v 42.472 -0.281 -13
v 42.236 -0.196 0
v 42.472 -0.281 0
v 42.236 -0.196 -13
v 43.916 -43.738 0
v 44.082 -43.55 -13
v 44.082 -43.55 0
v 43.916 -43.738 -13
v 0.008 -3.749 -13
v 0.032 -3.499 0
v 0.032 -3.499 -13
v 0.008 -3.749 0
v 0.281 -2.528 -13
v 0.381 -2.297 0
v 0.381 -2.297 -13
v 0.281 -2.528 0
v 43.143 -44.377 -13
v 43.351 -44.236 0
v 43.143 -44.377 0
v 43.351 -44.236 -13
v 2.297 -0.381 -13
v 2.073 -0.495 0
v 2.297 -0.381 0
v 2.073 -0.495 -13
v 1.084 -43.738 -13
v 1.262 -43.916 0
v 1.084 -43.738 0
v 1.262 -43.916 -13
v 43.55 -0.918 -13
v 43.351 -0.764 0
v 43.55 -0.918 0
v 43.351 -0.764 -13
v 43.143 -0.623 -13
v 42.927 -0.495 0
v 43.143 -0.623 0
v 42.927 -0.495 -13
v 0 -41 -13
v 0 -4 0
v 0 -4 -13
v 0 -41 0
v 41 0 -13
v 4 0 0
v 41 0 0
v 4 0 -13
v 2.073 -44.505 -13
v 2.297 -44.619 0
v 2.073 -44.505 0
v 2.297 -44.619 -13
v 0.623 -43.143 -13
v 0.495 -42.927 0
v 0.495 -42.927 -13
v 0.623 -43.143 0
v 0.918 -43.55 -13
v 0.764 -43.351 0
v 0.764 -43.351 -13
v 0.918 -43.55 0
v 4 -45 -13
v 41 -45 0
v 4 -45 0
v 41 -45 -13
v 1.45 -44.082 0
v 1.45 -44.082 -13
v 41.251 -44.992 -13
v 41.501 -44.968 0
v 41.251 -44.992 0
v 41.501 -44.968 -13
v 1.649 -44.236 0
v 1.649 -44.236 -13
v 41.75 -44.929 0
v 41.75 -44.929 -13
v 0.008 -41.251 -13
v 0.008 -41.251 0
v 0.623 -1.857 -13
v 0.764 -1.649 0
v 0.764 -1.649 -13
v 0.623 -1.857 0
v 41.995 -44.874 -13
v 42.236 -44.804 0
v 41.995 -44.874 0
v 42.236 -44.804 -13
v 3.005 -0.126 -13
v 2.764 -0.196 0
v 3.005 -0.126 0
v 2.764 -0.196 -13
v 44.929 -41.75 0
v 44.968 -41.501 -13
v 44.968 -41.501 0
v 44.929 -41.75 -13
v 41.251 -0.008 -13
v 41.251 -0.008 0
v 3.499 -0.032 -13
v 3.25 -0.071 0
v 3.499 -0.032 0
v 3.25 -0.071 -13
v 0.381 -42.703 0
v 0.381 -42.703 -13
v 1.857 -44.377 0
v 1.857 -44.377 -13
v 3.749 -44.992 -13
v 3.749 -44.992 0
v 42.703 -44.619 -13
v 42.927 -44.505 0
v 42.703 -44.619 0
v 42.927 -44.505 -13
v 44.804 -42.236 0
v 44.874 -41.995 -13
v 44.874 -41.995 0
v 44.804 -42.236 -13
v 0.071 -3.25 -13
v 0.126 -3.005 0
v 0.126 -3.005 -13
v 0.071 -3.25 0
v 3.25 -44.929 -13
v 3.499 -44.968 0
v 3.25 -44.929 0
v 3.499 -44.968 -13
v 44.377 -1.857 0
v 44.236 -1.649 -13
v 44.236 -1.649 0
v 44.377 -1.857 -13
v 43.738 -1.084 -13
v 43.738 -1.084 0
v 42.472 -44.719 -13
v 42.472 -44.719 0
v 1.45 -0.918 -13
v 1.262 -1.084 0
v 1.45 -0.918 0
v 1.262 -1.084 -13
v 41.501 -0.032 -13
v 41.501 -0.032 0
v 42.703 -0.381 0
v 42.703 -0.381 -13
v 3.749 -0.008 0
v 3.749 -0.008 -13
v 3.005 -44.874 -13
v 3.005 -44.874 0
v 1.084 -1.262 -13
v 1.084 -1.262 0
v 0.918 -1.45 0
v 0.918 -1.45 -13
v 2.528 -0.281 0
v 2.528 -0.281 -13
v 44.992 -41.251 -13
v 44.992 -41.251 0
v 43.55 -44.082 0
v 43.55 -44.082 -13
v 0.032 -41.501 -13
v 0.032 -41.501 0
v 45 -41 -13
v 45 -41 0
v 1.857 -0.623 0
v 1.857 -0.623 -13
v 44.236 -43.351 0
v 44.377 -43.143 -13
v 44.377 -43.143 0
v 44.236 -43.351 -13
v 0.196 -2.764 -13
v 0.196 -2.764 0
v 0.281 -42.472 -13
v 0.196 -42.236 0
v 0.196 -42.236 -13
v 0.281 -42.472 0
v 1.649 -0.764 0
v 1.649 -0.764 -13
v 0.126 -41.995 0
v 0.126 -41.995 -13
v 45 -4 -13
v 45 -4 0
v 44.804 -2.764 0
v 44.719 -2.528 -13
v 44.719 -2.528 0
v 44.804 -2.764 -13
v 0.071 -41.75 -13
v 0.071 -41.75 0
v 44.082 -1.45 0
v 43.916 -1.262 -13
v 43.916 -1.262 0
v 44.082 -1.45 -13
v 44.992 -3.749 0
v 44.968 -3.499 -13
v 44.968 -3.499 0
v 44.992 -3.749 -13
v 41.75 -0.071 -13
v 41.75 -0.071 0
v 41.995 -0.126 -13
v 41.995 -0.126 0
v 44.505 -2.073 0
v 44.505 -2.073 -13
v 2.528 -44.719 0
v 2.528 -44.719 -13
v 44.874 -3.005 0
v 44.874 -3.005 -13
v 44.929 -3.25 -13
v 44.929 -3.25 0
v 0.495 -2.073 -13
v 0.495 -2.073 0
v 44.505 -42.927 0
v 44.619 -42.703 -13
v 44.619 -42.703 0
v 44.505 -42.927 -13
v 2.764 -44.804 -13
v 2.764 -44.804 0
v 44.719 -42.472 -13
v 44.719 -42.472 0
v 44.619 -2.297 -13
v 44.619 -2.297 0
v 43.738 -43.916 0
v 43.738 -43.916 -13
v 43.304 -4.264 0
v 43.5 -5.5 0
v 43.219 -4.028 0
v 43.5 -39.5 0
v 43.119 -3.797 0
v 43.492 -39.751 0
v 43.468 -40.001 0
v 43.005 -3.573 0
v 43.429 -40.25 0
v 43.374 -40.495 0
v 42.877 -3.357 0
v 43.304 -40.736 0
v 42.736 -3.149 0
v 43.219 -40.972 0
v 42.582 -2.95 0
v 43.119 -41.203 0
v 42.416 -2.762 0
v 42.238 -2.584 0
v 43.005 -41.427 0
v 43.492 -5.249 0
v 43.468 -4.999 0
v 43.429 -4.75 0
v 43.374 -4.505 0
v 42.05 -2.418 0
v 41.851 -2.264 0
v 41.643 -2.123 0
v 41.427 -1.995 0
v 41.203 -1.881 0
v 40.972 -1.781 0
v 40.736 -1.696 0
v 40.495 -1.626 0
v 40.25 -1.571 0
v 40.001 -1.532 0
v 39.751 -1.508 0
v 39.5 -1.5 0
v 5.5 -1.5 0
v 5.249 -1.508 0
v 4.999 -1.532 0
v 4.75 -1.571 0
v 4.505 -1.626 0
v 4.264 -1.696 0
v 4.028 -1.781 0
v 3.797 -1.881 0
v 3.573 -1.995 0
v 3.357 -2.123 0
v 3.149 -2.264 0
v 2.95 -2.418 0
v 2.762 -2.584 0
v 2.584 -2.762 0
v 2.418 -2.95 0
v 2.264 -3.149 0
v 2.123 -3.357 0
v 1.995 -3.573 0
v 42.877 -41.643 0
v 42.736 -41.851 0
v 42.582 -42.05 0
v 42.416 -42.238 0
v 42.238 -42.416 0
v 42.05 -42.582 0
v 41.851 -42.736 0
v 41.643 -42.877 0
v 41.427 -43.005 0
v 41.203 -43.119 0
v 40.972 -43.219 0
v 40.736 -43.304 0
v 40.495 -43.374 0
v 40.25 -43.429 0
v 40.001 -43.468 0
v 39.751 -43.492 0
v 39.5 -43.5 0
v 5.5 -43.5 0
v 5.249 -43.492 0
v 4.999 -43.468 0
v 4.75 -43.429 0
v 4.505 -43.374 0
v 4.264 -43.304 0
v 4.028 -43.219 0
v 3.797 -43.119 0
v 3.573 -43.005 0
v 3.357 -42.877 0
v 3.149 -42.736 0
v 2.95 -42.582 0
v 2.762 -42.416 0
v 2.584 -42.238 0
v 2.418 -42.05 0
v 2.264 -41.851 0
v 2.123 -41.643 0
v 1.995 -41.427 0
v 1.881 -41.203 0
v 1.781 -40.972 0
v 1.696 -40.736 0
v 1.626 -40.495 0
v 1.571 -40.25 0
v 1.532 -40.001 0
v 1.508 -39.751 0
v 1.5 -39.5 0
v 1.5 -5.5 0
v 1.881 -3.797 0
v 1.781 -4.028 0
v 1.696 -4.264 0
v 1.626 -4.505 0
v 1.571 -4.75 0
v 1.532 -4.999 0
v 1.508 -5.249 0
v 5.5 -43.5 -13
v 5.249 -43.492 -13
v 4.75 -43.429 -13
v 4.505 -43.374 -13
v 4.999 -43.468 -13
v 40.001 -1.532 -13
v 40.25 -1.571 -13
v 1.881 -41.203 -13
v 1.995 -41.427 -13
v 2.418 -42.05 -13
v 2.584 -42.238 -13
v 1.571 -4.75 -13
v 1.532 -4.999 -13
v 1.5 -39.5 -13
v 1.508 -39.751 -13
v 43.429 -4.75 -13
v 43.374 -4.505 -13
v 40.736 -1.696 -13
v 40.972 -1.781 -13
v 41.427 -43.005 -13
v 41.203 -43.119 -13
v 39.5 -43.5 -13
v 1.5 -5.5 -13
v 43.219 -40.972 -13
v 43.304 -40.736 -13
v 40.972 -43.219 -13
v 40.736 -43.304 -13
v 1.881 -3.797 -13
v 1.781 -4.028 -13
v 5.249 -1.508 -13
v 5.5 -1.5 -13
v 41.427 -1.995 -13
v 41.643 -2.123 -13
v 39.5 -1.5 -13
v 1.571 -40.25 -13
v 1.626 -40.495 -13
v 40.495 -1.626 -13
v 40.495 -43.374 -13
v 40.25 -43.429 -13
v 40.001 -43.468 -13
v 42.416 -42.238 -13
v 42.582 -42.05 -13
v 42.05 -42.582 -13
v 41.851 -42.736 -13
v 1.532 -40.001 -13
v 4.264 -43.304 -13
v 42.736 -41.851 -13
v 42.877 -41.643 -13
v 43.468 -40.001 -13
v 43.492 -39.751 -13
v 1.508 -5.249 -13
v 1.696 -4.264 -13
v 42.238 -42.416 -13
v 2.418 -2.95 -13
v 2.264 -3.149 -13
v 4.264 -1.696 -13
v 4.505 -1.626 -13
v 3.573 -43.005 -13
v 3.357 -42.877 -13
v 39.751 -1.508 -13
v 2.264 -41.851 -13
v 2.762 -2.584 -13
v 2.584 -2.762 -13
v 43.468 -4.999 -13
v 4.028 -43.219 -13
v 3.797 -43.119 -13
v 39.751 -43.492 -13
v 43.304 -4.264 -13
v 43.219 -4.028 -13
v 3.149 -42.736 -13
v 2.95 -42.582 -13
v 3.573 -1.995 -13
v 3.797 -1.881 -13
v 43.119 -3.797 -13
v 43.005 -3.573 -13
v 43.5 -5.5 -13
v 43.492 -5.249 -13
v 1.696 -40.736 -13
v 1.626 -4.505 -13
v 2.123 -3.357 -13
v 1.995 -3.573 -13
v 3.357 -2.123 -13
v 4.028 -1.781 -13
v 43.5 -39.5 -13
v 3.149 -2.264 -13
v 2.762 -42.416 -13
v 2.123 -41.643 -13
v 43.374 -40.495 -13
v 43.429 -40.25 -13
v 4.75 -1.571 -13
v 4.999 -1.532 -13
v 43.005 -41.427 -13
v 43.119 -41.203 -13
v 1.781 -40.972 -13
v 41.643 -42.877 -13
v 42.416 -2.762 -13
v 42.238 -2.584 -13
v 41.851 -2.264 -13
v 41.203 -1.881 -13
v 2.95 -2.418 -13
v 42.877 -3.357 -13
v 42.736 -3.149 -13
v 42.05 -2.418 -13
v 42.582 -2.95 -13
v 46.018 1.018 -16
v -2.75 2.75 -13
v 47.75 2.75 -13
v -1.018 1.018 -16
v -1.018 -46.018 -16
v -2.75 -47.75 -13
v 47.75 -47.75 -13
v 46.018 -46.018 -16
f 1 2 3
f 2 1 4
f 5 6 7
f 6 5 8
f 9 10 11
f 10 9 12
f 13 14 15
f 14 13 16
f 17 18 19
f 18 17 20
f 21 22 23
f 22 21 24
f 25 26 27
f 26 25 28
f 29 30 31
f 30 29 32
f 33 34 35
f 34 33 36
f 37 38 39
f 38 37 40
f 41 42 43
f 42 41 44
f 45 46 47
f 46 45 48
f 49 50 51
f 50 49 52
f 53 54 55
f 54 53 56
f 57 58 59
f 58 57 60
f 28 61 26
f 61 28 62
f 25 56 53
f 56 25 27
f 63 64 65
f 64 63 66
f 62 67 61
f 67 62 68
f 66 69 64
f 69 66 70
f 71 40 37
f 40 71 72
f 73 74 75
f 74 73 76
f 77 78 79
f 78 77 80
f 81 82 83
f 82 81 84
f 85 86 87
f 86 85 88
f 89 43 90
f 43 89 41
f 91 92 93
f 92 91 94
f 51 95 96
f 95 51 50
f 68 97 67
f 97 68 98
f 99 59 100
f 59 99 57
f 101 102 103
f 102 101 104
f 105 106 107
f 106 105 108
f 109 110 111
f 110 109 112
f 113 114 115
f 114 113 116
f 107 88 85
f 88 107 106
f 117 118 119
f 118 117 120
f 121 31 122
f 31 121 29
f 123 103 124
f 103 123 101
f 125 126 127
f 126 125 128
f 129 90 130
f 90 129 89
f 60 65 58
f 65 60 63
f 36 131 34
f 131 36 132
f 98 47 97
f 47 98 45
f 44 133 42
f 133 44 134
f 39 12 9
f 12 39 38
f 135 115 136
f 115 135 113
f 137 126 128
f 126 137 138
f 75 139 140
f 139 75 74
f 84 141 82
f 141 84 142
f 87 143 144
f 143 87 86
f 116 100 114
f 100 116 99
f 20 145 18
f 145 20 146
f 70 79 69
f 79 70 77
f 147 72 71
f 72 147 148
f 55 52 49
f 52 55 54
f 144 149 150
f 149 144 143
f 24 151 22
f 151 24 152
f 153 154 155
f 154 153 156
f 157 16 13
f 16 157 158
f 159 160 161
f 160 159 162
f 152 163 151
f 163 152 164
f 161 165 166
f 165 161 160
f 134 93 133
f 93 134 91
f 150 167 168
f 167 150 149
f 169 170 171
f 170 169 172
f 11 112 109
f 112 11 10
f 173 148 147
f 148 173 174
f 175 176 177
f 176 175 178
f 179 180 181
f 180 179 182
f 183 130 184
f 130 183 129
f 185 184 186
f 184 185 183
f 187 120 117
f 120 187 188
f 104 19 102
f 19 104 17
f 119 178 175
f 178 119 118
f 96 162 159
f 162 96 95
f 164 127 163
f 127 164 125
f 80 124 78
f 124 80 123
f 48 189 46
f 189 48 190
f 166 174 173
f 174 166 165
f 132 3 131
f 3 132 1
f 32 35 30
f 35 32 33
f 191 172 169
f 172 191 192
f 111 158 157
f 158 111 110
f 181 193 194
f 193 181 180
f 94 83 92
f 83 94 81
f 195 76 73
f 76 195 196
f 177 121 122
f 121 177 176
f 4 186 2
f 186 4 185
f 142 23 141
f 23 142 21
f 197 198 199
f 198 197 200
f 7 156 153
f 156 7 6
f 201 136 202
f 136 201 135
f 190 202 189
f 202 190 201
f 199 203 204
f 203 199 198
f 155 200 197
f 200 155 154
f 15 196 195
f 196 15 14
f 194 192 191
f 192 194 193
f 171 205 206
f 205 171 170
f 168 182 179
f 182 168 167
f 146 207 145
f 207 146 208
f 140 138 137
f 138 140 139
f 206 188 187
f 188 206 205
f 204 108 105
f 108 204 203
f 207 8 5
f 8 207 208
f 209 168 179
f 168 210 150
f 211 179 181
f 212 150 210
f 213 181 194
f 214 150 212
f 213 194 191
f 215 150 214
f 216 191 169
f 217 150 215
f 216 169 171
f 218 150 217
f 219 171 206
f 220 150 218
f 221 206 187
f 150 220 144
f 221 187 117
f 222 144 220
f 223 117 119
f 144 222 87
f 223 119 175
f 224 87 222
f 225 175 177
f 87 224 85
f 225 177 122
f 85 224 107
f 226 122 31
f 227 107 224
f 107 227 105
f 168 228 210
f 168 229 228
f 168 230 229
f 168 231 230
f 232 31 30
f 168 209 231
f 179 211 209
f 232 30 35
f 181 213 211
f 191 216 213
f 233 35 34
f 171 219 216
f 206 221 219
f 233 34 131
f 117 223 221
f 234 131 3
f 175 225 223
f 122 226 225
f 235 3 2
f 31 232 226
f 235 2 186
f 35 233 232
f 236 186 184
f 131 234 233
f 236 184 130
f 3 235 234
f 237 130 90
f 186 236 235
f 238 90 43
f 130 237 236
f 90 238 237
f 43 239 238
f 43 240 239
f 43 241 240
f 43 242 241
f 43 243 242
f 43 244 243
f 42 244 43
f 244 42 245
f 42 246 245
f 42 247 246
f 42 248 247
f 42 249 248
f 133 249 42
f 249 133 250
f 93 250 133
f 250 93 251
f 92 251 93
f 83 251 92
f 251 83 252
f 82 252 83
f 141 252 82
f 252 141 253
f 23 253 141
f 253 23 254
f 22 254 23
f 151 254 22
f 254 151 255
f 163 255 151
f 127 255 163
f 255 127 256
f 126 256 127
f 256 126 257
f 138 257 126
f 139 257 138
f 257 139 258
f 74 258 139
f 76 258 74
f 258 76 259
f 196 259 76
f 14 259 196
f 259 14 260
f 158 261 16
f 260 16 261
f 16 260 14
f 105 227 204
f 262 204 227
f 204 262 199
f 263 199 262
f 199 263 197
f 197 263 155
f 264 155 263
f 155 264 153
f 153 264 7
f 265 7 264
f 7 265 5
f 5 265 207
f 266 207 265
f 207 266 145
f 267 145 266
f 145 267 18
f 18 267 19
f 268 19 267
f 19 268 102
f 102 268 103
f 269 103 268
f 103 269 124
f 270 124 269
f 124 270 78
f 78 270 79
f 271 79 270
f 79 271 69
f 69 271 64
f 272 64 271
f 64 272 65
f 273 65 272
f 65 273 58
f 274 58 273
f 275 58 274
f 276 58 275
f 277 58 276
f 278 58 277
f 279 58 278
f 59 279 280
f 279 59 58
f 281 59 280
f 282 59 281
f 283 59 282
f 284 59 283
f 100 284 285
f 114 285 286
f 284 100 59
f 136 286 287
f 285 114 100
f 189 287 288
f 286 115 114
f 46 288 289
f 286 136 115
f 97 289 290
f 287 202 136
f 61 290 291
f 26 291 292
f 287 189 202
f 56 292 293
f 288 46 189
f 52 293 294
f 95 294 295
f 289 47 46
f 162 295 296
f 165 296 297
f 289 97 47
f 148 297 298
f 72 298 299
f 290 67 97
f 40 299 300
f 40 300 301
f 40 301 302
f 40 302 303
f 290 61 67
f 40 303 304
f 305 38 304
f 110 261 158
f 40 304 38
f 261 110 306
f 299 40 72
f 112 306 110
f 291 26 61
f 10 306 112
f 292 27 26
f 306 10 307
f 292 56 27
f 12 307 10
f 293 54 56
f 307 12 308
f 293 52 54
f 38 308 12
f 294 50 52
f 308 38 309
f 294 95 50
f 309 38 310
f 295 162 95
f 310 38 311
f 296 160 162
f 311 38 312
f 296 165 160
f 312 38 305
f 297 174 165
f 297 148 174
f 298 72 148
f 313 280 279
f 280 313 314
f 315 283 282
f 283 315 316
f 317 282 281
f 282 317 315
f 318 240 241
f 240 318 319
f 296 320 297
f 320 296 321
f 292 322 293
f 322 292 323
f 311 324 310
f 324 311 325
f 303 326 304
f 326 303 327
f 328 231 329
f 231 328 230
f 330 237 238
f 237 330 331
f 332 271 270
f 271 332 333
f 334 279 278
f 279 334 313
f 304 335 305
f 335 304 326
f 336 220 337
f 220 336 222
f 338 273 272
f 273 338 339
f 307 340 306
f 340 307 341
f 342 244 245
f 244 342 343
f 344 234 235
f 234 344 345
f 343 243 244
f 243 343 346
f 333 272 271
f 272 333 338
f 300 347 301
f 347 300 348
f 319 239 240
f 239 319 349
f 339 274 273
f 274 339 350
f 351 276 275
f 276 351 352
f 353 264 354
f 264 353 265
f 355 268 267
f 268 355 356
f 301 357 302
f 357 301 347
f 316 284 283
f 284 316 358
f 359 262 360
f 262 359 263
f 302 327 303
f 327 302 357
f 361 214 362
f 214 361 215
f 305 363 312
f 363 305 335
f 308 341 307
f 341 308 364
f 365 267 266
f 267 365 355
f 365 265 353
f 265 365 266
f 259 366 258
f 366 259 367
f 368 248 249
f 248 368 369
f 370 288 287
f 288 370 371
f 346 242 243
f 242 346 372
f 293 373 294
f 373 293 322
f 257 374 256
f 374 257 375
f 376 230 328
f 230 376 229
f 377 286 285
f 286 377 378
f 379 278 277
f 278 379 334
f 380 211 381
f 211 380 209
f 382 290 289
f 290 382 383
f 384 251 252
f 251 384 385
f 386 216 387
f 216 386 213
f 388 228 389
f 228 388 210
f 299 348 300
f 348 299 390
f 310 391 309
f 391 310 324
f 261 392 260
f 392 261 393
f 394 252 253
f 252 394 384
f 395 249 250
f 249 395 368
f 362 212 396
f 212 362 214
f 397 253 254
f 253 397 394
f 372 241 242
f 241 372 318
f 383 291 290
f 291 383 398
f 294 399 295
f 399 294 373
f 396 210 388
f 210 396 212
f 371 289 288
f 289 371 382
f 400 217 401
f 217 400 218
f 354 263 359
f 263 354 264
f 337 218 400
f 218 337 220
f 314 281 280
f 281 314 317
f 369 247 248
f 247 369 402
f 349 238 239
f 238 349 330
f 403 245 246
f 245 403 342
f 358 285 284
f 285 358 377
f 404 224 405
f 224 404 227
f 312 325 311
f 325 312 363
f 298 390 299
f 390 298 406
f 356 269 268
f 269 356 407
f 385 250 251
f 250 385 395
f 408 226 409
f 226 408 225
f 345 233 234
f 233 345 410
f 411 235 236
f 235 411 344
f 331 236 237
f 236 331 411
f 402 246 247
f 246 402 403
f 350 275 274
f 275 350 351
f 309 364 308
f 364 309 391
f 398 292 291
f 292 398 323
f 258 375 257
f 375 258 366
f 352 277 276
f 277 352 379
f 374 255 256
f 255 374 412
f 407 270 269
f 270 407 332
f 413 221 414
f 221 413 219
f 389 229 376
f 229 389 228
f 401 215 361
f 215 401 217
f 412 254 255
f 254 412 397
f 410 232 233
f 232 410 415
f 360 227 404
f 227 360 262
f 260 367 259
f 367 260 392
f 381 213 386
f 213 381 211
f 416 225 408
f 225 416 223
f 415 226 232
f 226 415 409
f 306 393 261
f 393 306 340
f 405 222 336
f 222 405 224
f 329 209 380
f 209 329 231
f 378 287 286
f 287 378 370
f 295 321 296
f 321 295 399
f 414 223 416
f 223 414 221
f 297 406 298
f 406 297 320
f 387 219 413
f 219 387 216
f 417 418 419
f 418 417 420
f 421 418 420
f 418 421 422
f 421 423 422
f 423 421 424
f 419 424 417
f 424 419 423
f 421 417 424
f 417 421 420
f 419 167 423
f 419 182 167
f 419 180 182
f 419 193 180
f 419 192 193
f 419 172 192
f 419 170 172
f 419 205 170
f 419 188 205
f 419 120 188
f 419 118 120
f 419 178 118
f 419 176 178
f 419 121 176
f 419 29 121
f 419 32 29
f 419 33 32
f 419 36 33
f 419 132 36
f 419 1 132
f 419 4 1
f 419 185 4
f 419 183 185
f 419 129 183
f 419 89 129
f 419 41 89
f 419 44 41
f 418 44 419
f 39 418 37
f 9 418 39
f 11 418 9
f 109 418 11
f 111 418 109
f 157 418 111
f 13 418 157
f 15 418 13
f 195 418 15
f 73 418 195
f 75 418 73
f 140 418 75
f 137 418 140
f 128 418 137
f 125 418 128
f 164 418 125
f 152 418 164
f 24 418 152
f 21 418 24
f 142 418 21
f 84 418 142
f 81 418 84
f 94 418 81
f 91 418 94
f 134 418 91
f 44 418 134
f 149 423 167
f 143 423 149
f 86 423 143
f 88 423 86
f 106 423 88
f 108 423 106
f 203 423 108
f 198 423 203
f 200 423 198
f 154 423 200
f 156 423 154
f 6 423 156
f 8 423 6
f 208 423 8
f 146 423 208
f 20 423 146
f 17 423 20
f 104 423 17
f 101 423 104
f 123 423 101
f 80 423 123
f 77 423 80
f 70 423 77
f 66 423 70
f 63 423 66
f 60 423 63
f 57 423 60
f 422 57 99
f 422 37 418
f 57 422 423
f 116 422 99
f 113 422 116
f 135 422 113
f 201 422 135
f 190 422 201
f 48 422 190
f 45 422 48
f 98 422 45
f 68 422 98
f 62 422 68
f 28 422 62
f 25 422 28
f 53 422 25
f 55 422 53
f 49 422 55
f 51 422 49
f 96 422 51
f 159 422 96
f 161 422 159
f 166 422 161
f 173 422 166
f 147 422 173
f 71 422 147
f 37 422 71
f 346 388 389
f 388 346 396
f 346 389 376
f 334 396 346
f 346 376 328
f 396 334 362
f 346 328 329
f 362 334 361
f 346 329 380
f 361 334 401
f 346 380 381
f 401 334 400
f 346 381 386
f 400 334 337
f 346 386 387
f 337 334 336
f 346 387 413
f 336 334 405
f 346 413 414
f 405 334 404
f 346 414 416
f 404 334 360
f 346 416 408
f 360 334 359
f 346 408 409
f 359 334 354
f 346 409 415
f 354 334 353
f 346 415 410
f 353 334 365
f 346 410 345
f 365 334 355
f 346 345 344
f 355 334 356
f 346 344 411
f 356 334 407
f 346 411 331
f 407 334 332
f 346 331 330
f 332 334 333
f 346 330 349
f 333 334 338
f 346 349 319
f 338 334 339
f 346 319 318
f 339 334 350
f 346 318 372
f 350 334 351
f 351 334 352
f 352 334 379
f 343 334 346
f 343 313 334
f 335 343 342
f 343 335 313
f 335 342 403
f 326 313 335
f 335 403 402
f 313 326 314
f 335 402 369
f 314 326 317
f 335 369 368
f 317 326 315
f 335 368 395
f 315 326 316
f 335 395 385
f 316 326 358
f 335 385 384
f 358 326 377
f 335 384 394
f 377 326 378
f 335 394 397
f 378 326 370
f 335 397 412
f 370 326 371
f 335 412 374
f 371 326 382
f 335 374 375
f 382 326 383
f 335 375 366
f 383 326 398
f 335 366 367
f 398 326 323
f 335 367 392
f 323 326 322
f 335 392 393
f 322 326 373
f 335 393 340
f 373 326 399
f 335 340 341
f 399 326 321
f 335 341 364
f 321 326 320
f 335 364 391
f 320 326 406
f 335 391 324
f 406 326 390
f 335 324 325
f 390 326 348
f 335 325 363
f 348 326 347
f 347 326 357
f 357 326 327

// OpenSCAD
$fn = 100;
width = 45;
height = width;
depth = 13;

cornerRadius = 4;
cornerDiameter = cornerRadius * 2;
sidewallThickness = 1.5;
sidewallWidth = width - cornerDiameter;
sidewallHeight = height - cornerDiameter;

roofDepth = 3;
roofOverhang = 2.75;
roofWidth = width + (roofOverhang * 2);
roofHeight = height + (roofOverhang * 2);

module roundedCorners
(
    x = 0,
    y = 0,
    z = 0,
    width = 10,
    height = 10
)
{
    translate
    (
        [
            x + cornerRadius,
            y + cornerRadius,
            z
        ]
    )
    {
        minkowski()
        {
            cylinder
            (
                1,
                cornerRadius,
                cornerRadius,
                center = false
            );

            cube
            (
                size =
                [
                    width,
                    height,
                    1
                ],
                center = false
            );
        }
    }
}

module sidewalls()
{
    difference()
    {
        hull()
        {
            //Top
            roundedCorners
            (
                x = 0,
                y = 0,
                z = 0,
                width = sidewallWidth,
                height = sidewallHeight
            );

            //Bottom
            roundedCorners
            (
                x = 0,
                y = 0,
                z = depth,
                width = sidewallWidth,
                height = sidewallHeight
            );
        }

        //Interior
        translate
        (
            [
                sidewallThickness,
                sidewallThickness,
                -1
            ]
        )
        {
            hull()
            {
                wide = sidewallWidth - (sidewallThickness * 2);
                hide = sidewallHeight - (sidewallThickness * 2);
                //Top
                roundedCorners
                (
                    width = wide,
                    height = hide,
                    z = 0
                );

                //Bottom
                roundedCorners
                (
                    width = wide,
                    height = hide,
                    z = depth + 2
                );
            }
        }
    }
}

module chamfer
(
    angle = 45
)
{
    half_chamfer( angle = angle );
    translate
    (
        [
            roofWidth,
            roofHeight,
            0
        ]
    )
    {
        rotate
        (
            [
                0,
                0,
                180
            ]
        )
        {
            half_chamfer( angle = angle );
        }
    }
}

module half_chamfer
(
    angle = 45
)
{
    rotate
    (
        [
            90 - angle,
            0,
            0
        ]
    )
    {
        cube
        (
            [
                roofWidth,
                roofDepth * 2,
                roofDepth * 2
            ],
            center = false
        );
    }

    rotate
    (
        [
            angle,
            0,
            90
        ]
    )
    {
        cube
        (
            [
                roofWidth,
                roofDepth * 2,
                roofDepth * 2
            ],
            center = false
        );
    }
}

module roof()
{
    translate
    (
        [
            -roofOverhang,
            -roofOverhang,
            depth
        ]
    )
    {
        difference()
        {
            cube
            (
                [
                    roofWidth,
                    roofHeight,
                    roofDepth
                ],
                center = false
            );

            chamfer(angle = 30);
        }
    }
}

module main()
{
    rotate
    (
        [
            180,
            0,
            0
        ]
    )
    {
        sidewalls();
        roof();
    }
}

main();
